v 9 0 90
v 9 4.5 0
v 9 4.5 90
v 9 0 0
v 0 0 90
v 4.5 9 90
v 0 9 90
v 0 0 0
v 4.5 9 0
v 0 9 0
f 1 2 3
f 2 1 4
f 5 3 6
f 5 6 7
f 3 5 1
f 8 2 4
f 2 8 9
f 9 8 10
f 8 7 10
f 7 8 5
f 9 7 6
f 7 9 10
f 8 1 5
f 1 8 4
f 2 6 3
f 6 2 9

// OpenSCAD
$fn = 100;

radius = 15;
length = 90;
wall_thickness = 3;

module frame_connector(radius, length, wall_thickness) {
    connector_size = radius - 2*wall_thickness;
    difference() {
        cube([connector_size, connector_size, length]);

        translate([connector_size, connector_size/2, -1])
        rotate([0, 0, 45])
        cube([connector_size, connector_size, length+2]);
    }
}

frame_connector(
    radius = radius,
    length = length,
    wall_thickness = wall_thickness
);
